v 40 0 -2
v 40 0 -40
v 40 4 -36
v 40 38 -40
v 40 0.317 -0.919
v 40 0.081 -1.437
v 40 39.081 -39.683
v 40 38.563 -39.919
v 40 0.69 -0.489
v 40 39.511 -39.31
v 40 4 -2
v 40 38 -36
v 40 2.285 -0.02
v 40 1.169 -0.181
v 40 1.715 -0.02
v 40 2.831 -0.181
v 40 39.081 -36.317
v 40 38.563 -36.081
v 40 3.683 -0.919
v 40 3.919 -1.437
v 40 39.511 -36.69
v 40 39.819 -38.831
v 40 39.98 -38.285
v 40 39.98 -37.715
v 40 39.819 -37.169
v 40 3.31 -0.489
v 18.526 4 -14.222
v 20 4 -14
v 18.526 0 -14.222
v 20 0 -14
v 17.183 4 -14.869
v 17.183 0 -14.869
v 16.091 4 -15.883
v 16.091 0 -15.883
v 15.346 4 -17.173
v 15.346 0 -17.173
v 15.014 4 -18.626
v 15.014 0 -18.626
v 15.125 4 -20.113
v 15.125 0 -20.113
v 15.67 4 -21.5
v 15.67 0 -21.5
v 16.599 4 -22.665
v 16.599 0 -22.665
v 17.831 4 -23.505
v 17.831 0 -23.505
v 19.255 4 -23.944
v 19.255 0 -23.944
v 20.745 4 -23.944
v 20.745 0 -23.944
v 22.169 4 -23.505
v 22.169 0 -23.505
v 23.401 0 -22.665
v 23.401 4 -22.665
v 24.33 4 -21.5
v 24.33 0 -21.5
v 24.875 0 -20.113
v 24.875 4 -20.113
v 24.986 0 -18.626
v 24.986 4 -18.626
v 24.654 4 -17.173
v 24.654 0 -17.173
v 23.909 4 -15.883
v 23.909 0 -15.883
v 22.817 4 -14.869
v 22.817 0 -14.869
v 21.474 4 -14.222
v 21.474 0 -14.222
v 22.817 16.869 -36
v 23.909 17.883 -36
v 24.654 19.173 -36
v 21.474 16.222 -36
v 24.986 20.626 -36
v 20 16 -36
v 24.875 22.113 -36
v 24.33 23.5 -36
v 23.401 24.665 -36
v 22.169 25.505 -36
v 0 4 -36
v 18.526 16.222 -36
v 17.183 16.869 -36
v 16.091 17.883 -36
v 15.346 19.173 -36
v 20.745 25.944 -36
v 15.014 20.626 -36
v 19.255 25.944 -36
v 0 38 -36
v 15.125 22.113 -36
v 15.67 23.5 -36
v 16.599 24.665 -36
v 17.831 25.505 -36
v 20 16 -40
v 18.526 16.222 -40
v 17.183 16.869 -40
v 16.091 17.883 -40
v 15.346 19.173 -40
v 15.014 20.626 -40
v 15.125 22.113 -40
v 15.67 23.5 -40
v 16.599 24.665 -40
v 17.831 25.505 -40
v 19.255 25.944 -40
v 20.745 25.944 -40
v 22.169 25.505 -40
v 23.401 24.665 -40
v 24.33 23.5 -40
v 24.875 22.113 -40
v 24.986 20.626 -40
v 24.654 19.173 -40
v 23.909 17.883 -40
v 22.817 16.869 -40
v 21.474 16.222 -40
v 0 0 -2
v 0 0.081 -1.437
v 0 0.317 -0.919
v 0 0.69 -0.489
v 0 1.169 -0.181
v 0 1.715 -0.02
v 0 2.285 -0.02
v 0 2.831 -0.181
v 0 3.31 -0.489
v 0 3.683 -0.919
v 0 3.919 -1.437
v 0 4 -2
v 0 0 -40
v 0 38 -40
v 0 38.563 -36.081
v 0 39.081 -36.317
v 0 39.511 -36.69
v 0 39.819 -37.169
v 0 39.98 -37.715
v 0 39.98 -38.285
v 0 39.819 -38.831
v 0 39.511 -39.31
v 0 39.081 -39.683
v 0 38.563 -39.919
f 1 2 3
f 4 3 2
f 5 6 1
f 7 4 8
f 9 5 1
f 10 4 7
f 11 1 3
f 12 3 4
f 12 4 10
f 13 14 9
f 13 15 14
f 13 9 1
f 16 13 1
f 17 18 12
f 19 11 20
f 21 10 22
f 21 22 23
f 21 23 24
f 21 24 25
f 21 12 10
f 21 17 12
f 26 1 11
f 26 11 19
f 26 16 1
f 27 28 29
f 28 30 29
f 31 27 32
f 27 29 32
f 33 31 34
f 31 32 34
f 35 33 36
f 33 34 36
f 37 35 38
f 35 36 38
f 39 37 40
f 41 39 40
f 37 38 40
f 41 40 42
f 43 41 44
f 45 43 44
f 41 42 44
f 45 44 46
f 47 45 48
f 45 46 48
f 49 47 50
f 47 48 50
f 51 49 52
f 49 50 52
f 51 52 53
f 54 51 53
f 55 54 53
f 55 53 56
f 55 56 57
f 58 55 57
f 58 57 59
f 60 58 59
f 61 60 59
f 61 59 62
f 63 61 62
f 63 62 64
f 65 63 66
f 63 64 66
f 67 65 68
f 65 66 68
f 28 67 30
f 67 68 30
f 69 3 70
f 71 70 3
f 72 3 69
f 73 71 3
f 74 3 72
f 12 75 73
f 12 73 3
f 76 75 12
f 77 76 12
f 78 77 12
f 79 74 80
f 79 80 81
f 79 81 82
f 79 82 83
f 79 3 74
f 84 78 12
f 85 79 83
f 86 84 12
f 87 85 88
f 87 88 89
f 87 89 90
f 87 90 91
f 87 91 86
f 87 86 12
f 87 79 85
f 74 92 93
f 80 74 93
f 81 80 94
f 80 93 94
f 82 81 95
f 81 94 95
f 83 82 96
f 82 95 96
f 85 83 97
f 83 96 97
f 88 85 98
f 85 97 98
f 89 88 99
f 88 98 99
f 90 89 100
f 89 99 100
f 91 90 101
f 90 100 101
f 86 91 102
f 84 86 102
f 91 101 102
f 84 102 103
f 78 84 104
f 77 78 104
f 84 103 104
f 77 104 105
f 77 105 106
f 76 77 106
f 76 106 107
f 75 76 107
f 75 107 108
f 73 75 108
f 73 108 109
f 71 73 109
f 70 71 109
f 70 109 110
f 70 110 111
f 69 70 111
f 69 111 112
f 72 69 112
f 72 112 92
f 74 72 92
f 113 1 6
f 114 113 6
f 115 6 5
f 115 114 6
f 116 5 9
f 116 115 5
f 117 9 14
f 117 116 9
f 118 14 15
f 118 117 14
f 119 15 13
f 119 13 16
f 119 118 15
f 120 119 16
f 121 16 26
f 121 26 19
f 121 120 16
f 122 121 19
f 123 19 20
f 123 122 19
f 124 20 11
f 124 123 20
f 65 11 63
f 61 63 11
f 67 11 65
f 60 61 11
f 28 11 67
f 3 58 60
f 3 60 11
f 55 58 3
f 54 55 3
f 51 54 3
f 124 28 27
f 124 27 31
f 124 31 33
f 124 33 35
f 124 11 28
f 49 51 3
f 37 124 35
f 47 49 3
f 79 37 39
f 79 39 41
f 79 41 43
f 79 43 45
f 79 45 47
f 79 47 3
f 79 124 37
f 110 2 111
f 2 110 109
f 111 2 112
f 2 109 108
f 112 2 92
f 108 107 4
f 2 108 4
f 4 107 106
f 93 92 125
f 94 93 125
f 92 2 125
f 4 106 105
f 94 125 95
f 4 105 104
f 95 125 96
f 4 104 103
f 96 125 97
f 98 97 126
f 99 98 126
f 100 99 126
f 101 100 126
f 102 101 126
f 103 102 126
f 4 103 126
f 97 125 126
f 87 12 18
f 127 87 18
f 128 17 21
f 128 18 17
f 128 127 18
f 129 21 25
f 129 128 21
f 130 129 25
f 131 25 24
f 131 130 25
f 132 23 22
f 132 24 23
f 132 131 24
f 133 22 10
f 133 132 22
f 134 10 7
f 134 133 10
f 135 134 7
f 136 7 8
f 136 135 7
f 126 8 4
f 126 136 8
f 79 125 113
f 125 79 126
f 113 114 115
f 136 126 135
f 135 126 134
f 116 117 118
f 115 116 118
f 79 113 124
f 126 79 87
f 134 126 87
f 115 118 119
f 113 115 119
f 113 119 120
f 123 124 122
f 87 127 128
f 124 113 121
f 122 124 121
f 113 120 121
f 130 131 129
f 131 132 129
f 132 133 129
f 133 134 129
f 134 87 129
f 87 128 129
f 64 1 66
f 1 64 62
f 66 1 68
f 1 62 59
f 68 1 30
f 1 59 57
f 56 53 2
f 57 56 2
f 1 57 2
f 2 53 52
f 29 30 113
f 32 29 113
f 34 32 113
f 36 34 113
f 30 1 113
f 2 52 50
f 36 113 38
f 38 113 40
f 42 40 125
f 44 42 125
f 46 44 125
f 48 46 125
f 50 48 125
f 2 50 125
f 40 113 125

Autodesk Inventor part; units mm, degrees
ref_plane "YZ Plane" through (0, 0, 0) normal (1, 0, 0) x (0, 1, 0)
ref_plane "XZ Plane" through (0, 0, 0) normal (0, 1, 0) x (-1, 0, 0)
ref_plane "XY Plane" through (0, 0, 0) normal (0, 0, 1) x (1, 0, 0)
sketch "Sketch1" plane through (0, 0, 0) normal (1, 0, 0) x (0, 1, 0)
  line L0 (0, -2) -> (0, -40)
  line L1 (0, -40) -> (38, -40)
  line L2 (4, -2) -> (4, -36)
  line L3 (4, -36) -> (38, -36)
  line L4 (2, 0) -> (2, 0)
  line L5 (40, -38) -> (40, -38)
  arc A0 (40, -38) -> (38, -36) centre (38, -38) ccw
  arc A1 (38, -40) -> (40, -38) centre (38, -38) ccw
  arc A2 (4, -2) -> (2, 0) centre (2, -2) ccw
  arc A3 (2, 0) -> (0, -2) centre (2, -2) ccw
  point P0 (0, 0)
  point P1 (40, -40)
  point P2 (2, 0)
  dimension "d0" = 40
  dimension "d1" = 40
  dimension "d2" = 4
  dimension "d3" = 2
extrude "Extrusion1" add sketch "Sketch1" along normal blind 40
sketch "Sketch2" plane through (0, 4, -2) normal (0, 1, 0) x (1, 0, 0)
  line L0 (0, 34) -> (0, 0) projected
  line L1 (0, 0) -> (40, 0) projected
  line L2 (40, 34) -> (40, 0) projected
  line L3 (0, 34) -> (40, 34) projected
  point P0 (0, -2)
  point P1 (20, 17)
hole "Hole1" at (20, 4, -19) direction (0, -1, 0) diameter 10 end through all
sketch "Sketch3" plane through (0, 4, -36) normal (0, 0, 1) x (1, 0, 0)
  line L0 (0, 34) -> (0, 0) construction
  line L1 (0, 0) -> (40, 0) construction
  line L2 (40, 34) -> (40, 0) construction
  line L3 (0, 34) -> (40, 34) construction
  point P0 (0, -4)
  point P1 (20, 17)
hole "Hole2" at (20, 21, -36) direction (0, 0, -1) diameter 10 end through all
properties part number "LVas"
